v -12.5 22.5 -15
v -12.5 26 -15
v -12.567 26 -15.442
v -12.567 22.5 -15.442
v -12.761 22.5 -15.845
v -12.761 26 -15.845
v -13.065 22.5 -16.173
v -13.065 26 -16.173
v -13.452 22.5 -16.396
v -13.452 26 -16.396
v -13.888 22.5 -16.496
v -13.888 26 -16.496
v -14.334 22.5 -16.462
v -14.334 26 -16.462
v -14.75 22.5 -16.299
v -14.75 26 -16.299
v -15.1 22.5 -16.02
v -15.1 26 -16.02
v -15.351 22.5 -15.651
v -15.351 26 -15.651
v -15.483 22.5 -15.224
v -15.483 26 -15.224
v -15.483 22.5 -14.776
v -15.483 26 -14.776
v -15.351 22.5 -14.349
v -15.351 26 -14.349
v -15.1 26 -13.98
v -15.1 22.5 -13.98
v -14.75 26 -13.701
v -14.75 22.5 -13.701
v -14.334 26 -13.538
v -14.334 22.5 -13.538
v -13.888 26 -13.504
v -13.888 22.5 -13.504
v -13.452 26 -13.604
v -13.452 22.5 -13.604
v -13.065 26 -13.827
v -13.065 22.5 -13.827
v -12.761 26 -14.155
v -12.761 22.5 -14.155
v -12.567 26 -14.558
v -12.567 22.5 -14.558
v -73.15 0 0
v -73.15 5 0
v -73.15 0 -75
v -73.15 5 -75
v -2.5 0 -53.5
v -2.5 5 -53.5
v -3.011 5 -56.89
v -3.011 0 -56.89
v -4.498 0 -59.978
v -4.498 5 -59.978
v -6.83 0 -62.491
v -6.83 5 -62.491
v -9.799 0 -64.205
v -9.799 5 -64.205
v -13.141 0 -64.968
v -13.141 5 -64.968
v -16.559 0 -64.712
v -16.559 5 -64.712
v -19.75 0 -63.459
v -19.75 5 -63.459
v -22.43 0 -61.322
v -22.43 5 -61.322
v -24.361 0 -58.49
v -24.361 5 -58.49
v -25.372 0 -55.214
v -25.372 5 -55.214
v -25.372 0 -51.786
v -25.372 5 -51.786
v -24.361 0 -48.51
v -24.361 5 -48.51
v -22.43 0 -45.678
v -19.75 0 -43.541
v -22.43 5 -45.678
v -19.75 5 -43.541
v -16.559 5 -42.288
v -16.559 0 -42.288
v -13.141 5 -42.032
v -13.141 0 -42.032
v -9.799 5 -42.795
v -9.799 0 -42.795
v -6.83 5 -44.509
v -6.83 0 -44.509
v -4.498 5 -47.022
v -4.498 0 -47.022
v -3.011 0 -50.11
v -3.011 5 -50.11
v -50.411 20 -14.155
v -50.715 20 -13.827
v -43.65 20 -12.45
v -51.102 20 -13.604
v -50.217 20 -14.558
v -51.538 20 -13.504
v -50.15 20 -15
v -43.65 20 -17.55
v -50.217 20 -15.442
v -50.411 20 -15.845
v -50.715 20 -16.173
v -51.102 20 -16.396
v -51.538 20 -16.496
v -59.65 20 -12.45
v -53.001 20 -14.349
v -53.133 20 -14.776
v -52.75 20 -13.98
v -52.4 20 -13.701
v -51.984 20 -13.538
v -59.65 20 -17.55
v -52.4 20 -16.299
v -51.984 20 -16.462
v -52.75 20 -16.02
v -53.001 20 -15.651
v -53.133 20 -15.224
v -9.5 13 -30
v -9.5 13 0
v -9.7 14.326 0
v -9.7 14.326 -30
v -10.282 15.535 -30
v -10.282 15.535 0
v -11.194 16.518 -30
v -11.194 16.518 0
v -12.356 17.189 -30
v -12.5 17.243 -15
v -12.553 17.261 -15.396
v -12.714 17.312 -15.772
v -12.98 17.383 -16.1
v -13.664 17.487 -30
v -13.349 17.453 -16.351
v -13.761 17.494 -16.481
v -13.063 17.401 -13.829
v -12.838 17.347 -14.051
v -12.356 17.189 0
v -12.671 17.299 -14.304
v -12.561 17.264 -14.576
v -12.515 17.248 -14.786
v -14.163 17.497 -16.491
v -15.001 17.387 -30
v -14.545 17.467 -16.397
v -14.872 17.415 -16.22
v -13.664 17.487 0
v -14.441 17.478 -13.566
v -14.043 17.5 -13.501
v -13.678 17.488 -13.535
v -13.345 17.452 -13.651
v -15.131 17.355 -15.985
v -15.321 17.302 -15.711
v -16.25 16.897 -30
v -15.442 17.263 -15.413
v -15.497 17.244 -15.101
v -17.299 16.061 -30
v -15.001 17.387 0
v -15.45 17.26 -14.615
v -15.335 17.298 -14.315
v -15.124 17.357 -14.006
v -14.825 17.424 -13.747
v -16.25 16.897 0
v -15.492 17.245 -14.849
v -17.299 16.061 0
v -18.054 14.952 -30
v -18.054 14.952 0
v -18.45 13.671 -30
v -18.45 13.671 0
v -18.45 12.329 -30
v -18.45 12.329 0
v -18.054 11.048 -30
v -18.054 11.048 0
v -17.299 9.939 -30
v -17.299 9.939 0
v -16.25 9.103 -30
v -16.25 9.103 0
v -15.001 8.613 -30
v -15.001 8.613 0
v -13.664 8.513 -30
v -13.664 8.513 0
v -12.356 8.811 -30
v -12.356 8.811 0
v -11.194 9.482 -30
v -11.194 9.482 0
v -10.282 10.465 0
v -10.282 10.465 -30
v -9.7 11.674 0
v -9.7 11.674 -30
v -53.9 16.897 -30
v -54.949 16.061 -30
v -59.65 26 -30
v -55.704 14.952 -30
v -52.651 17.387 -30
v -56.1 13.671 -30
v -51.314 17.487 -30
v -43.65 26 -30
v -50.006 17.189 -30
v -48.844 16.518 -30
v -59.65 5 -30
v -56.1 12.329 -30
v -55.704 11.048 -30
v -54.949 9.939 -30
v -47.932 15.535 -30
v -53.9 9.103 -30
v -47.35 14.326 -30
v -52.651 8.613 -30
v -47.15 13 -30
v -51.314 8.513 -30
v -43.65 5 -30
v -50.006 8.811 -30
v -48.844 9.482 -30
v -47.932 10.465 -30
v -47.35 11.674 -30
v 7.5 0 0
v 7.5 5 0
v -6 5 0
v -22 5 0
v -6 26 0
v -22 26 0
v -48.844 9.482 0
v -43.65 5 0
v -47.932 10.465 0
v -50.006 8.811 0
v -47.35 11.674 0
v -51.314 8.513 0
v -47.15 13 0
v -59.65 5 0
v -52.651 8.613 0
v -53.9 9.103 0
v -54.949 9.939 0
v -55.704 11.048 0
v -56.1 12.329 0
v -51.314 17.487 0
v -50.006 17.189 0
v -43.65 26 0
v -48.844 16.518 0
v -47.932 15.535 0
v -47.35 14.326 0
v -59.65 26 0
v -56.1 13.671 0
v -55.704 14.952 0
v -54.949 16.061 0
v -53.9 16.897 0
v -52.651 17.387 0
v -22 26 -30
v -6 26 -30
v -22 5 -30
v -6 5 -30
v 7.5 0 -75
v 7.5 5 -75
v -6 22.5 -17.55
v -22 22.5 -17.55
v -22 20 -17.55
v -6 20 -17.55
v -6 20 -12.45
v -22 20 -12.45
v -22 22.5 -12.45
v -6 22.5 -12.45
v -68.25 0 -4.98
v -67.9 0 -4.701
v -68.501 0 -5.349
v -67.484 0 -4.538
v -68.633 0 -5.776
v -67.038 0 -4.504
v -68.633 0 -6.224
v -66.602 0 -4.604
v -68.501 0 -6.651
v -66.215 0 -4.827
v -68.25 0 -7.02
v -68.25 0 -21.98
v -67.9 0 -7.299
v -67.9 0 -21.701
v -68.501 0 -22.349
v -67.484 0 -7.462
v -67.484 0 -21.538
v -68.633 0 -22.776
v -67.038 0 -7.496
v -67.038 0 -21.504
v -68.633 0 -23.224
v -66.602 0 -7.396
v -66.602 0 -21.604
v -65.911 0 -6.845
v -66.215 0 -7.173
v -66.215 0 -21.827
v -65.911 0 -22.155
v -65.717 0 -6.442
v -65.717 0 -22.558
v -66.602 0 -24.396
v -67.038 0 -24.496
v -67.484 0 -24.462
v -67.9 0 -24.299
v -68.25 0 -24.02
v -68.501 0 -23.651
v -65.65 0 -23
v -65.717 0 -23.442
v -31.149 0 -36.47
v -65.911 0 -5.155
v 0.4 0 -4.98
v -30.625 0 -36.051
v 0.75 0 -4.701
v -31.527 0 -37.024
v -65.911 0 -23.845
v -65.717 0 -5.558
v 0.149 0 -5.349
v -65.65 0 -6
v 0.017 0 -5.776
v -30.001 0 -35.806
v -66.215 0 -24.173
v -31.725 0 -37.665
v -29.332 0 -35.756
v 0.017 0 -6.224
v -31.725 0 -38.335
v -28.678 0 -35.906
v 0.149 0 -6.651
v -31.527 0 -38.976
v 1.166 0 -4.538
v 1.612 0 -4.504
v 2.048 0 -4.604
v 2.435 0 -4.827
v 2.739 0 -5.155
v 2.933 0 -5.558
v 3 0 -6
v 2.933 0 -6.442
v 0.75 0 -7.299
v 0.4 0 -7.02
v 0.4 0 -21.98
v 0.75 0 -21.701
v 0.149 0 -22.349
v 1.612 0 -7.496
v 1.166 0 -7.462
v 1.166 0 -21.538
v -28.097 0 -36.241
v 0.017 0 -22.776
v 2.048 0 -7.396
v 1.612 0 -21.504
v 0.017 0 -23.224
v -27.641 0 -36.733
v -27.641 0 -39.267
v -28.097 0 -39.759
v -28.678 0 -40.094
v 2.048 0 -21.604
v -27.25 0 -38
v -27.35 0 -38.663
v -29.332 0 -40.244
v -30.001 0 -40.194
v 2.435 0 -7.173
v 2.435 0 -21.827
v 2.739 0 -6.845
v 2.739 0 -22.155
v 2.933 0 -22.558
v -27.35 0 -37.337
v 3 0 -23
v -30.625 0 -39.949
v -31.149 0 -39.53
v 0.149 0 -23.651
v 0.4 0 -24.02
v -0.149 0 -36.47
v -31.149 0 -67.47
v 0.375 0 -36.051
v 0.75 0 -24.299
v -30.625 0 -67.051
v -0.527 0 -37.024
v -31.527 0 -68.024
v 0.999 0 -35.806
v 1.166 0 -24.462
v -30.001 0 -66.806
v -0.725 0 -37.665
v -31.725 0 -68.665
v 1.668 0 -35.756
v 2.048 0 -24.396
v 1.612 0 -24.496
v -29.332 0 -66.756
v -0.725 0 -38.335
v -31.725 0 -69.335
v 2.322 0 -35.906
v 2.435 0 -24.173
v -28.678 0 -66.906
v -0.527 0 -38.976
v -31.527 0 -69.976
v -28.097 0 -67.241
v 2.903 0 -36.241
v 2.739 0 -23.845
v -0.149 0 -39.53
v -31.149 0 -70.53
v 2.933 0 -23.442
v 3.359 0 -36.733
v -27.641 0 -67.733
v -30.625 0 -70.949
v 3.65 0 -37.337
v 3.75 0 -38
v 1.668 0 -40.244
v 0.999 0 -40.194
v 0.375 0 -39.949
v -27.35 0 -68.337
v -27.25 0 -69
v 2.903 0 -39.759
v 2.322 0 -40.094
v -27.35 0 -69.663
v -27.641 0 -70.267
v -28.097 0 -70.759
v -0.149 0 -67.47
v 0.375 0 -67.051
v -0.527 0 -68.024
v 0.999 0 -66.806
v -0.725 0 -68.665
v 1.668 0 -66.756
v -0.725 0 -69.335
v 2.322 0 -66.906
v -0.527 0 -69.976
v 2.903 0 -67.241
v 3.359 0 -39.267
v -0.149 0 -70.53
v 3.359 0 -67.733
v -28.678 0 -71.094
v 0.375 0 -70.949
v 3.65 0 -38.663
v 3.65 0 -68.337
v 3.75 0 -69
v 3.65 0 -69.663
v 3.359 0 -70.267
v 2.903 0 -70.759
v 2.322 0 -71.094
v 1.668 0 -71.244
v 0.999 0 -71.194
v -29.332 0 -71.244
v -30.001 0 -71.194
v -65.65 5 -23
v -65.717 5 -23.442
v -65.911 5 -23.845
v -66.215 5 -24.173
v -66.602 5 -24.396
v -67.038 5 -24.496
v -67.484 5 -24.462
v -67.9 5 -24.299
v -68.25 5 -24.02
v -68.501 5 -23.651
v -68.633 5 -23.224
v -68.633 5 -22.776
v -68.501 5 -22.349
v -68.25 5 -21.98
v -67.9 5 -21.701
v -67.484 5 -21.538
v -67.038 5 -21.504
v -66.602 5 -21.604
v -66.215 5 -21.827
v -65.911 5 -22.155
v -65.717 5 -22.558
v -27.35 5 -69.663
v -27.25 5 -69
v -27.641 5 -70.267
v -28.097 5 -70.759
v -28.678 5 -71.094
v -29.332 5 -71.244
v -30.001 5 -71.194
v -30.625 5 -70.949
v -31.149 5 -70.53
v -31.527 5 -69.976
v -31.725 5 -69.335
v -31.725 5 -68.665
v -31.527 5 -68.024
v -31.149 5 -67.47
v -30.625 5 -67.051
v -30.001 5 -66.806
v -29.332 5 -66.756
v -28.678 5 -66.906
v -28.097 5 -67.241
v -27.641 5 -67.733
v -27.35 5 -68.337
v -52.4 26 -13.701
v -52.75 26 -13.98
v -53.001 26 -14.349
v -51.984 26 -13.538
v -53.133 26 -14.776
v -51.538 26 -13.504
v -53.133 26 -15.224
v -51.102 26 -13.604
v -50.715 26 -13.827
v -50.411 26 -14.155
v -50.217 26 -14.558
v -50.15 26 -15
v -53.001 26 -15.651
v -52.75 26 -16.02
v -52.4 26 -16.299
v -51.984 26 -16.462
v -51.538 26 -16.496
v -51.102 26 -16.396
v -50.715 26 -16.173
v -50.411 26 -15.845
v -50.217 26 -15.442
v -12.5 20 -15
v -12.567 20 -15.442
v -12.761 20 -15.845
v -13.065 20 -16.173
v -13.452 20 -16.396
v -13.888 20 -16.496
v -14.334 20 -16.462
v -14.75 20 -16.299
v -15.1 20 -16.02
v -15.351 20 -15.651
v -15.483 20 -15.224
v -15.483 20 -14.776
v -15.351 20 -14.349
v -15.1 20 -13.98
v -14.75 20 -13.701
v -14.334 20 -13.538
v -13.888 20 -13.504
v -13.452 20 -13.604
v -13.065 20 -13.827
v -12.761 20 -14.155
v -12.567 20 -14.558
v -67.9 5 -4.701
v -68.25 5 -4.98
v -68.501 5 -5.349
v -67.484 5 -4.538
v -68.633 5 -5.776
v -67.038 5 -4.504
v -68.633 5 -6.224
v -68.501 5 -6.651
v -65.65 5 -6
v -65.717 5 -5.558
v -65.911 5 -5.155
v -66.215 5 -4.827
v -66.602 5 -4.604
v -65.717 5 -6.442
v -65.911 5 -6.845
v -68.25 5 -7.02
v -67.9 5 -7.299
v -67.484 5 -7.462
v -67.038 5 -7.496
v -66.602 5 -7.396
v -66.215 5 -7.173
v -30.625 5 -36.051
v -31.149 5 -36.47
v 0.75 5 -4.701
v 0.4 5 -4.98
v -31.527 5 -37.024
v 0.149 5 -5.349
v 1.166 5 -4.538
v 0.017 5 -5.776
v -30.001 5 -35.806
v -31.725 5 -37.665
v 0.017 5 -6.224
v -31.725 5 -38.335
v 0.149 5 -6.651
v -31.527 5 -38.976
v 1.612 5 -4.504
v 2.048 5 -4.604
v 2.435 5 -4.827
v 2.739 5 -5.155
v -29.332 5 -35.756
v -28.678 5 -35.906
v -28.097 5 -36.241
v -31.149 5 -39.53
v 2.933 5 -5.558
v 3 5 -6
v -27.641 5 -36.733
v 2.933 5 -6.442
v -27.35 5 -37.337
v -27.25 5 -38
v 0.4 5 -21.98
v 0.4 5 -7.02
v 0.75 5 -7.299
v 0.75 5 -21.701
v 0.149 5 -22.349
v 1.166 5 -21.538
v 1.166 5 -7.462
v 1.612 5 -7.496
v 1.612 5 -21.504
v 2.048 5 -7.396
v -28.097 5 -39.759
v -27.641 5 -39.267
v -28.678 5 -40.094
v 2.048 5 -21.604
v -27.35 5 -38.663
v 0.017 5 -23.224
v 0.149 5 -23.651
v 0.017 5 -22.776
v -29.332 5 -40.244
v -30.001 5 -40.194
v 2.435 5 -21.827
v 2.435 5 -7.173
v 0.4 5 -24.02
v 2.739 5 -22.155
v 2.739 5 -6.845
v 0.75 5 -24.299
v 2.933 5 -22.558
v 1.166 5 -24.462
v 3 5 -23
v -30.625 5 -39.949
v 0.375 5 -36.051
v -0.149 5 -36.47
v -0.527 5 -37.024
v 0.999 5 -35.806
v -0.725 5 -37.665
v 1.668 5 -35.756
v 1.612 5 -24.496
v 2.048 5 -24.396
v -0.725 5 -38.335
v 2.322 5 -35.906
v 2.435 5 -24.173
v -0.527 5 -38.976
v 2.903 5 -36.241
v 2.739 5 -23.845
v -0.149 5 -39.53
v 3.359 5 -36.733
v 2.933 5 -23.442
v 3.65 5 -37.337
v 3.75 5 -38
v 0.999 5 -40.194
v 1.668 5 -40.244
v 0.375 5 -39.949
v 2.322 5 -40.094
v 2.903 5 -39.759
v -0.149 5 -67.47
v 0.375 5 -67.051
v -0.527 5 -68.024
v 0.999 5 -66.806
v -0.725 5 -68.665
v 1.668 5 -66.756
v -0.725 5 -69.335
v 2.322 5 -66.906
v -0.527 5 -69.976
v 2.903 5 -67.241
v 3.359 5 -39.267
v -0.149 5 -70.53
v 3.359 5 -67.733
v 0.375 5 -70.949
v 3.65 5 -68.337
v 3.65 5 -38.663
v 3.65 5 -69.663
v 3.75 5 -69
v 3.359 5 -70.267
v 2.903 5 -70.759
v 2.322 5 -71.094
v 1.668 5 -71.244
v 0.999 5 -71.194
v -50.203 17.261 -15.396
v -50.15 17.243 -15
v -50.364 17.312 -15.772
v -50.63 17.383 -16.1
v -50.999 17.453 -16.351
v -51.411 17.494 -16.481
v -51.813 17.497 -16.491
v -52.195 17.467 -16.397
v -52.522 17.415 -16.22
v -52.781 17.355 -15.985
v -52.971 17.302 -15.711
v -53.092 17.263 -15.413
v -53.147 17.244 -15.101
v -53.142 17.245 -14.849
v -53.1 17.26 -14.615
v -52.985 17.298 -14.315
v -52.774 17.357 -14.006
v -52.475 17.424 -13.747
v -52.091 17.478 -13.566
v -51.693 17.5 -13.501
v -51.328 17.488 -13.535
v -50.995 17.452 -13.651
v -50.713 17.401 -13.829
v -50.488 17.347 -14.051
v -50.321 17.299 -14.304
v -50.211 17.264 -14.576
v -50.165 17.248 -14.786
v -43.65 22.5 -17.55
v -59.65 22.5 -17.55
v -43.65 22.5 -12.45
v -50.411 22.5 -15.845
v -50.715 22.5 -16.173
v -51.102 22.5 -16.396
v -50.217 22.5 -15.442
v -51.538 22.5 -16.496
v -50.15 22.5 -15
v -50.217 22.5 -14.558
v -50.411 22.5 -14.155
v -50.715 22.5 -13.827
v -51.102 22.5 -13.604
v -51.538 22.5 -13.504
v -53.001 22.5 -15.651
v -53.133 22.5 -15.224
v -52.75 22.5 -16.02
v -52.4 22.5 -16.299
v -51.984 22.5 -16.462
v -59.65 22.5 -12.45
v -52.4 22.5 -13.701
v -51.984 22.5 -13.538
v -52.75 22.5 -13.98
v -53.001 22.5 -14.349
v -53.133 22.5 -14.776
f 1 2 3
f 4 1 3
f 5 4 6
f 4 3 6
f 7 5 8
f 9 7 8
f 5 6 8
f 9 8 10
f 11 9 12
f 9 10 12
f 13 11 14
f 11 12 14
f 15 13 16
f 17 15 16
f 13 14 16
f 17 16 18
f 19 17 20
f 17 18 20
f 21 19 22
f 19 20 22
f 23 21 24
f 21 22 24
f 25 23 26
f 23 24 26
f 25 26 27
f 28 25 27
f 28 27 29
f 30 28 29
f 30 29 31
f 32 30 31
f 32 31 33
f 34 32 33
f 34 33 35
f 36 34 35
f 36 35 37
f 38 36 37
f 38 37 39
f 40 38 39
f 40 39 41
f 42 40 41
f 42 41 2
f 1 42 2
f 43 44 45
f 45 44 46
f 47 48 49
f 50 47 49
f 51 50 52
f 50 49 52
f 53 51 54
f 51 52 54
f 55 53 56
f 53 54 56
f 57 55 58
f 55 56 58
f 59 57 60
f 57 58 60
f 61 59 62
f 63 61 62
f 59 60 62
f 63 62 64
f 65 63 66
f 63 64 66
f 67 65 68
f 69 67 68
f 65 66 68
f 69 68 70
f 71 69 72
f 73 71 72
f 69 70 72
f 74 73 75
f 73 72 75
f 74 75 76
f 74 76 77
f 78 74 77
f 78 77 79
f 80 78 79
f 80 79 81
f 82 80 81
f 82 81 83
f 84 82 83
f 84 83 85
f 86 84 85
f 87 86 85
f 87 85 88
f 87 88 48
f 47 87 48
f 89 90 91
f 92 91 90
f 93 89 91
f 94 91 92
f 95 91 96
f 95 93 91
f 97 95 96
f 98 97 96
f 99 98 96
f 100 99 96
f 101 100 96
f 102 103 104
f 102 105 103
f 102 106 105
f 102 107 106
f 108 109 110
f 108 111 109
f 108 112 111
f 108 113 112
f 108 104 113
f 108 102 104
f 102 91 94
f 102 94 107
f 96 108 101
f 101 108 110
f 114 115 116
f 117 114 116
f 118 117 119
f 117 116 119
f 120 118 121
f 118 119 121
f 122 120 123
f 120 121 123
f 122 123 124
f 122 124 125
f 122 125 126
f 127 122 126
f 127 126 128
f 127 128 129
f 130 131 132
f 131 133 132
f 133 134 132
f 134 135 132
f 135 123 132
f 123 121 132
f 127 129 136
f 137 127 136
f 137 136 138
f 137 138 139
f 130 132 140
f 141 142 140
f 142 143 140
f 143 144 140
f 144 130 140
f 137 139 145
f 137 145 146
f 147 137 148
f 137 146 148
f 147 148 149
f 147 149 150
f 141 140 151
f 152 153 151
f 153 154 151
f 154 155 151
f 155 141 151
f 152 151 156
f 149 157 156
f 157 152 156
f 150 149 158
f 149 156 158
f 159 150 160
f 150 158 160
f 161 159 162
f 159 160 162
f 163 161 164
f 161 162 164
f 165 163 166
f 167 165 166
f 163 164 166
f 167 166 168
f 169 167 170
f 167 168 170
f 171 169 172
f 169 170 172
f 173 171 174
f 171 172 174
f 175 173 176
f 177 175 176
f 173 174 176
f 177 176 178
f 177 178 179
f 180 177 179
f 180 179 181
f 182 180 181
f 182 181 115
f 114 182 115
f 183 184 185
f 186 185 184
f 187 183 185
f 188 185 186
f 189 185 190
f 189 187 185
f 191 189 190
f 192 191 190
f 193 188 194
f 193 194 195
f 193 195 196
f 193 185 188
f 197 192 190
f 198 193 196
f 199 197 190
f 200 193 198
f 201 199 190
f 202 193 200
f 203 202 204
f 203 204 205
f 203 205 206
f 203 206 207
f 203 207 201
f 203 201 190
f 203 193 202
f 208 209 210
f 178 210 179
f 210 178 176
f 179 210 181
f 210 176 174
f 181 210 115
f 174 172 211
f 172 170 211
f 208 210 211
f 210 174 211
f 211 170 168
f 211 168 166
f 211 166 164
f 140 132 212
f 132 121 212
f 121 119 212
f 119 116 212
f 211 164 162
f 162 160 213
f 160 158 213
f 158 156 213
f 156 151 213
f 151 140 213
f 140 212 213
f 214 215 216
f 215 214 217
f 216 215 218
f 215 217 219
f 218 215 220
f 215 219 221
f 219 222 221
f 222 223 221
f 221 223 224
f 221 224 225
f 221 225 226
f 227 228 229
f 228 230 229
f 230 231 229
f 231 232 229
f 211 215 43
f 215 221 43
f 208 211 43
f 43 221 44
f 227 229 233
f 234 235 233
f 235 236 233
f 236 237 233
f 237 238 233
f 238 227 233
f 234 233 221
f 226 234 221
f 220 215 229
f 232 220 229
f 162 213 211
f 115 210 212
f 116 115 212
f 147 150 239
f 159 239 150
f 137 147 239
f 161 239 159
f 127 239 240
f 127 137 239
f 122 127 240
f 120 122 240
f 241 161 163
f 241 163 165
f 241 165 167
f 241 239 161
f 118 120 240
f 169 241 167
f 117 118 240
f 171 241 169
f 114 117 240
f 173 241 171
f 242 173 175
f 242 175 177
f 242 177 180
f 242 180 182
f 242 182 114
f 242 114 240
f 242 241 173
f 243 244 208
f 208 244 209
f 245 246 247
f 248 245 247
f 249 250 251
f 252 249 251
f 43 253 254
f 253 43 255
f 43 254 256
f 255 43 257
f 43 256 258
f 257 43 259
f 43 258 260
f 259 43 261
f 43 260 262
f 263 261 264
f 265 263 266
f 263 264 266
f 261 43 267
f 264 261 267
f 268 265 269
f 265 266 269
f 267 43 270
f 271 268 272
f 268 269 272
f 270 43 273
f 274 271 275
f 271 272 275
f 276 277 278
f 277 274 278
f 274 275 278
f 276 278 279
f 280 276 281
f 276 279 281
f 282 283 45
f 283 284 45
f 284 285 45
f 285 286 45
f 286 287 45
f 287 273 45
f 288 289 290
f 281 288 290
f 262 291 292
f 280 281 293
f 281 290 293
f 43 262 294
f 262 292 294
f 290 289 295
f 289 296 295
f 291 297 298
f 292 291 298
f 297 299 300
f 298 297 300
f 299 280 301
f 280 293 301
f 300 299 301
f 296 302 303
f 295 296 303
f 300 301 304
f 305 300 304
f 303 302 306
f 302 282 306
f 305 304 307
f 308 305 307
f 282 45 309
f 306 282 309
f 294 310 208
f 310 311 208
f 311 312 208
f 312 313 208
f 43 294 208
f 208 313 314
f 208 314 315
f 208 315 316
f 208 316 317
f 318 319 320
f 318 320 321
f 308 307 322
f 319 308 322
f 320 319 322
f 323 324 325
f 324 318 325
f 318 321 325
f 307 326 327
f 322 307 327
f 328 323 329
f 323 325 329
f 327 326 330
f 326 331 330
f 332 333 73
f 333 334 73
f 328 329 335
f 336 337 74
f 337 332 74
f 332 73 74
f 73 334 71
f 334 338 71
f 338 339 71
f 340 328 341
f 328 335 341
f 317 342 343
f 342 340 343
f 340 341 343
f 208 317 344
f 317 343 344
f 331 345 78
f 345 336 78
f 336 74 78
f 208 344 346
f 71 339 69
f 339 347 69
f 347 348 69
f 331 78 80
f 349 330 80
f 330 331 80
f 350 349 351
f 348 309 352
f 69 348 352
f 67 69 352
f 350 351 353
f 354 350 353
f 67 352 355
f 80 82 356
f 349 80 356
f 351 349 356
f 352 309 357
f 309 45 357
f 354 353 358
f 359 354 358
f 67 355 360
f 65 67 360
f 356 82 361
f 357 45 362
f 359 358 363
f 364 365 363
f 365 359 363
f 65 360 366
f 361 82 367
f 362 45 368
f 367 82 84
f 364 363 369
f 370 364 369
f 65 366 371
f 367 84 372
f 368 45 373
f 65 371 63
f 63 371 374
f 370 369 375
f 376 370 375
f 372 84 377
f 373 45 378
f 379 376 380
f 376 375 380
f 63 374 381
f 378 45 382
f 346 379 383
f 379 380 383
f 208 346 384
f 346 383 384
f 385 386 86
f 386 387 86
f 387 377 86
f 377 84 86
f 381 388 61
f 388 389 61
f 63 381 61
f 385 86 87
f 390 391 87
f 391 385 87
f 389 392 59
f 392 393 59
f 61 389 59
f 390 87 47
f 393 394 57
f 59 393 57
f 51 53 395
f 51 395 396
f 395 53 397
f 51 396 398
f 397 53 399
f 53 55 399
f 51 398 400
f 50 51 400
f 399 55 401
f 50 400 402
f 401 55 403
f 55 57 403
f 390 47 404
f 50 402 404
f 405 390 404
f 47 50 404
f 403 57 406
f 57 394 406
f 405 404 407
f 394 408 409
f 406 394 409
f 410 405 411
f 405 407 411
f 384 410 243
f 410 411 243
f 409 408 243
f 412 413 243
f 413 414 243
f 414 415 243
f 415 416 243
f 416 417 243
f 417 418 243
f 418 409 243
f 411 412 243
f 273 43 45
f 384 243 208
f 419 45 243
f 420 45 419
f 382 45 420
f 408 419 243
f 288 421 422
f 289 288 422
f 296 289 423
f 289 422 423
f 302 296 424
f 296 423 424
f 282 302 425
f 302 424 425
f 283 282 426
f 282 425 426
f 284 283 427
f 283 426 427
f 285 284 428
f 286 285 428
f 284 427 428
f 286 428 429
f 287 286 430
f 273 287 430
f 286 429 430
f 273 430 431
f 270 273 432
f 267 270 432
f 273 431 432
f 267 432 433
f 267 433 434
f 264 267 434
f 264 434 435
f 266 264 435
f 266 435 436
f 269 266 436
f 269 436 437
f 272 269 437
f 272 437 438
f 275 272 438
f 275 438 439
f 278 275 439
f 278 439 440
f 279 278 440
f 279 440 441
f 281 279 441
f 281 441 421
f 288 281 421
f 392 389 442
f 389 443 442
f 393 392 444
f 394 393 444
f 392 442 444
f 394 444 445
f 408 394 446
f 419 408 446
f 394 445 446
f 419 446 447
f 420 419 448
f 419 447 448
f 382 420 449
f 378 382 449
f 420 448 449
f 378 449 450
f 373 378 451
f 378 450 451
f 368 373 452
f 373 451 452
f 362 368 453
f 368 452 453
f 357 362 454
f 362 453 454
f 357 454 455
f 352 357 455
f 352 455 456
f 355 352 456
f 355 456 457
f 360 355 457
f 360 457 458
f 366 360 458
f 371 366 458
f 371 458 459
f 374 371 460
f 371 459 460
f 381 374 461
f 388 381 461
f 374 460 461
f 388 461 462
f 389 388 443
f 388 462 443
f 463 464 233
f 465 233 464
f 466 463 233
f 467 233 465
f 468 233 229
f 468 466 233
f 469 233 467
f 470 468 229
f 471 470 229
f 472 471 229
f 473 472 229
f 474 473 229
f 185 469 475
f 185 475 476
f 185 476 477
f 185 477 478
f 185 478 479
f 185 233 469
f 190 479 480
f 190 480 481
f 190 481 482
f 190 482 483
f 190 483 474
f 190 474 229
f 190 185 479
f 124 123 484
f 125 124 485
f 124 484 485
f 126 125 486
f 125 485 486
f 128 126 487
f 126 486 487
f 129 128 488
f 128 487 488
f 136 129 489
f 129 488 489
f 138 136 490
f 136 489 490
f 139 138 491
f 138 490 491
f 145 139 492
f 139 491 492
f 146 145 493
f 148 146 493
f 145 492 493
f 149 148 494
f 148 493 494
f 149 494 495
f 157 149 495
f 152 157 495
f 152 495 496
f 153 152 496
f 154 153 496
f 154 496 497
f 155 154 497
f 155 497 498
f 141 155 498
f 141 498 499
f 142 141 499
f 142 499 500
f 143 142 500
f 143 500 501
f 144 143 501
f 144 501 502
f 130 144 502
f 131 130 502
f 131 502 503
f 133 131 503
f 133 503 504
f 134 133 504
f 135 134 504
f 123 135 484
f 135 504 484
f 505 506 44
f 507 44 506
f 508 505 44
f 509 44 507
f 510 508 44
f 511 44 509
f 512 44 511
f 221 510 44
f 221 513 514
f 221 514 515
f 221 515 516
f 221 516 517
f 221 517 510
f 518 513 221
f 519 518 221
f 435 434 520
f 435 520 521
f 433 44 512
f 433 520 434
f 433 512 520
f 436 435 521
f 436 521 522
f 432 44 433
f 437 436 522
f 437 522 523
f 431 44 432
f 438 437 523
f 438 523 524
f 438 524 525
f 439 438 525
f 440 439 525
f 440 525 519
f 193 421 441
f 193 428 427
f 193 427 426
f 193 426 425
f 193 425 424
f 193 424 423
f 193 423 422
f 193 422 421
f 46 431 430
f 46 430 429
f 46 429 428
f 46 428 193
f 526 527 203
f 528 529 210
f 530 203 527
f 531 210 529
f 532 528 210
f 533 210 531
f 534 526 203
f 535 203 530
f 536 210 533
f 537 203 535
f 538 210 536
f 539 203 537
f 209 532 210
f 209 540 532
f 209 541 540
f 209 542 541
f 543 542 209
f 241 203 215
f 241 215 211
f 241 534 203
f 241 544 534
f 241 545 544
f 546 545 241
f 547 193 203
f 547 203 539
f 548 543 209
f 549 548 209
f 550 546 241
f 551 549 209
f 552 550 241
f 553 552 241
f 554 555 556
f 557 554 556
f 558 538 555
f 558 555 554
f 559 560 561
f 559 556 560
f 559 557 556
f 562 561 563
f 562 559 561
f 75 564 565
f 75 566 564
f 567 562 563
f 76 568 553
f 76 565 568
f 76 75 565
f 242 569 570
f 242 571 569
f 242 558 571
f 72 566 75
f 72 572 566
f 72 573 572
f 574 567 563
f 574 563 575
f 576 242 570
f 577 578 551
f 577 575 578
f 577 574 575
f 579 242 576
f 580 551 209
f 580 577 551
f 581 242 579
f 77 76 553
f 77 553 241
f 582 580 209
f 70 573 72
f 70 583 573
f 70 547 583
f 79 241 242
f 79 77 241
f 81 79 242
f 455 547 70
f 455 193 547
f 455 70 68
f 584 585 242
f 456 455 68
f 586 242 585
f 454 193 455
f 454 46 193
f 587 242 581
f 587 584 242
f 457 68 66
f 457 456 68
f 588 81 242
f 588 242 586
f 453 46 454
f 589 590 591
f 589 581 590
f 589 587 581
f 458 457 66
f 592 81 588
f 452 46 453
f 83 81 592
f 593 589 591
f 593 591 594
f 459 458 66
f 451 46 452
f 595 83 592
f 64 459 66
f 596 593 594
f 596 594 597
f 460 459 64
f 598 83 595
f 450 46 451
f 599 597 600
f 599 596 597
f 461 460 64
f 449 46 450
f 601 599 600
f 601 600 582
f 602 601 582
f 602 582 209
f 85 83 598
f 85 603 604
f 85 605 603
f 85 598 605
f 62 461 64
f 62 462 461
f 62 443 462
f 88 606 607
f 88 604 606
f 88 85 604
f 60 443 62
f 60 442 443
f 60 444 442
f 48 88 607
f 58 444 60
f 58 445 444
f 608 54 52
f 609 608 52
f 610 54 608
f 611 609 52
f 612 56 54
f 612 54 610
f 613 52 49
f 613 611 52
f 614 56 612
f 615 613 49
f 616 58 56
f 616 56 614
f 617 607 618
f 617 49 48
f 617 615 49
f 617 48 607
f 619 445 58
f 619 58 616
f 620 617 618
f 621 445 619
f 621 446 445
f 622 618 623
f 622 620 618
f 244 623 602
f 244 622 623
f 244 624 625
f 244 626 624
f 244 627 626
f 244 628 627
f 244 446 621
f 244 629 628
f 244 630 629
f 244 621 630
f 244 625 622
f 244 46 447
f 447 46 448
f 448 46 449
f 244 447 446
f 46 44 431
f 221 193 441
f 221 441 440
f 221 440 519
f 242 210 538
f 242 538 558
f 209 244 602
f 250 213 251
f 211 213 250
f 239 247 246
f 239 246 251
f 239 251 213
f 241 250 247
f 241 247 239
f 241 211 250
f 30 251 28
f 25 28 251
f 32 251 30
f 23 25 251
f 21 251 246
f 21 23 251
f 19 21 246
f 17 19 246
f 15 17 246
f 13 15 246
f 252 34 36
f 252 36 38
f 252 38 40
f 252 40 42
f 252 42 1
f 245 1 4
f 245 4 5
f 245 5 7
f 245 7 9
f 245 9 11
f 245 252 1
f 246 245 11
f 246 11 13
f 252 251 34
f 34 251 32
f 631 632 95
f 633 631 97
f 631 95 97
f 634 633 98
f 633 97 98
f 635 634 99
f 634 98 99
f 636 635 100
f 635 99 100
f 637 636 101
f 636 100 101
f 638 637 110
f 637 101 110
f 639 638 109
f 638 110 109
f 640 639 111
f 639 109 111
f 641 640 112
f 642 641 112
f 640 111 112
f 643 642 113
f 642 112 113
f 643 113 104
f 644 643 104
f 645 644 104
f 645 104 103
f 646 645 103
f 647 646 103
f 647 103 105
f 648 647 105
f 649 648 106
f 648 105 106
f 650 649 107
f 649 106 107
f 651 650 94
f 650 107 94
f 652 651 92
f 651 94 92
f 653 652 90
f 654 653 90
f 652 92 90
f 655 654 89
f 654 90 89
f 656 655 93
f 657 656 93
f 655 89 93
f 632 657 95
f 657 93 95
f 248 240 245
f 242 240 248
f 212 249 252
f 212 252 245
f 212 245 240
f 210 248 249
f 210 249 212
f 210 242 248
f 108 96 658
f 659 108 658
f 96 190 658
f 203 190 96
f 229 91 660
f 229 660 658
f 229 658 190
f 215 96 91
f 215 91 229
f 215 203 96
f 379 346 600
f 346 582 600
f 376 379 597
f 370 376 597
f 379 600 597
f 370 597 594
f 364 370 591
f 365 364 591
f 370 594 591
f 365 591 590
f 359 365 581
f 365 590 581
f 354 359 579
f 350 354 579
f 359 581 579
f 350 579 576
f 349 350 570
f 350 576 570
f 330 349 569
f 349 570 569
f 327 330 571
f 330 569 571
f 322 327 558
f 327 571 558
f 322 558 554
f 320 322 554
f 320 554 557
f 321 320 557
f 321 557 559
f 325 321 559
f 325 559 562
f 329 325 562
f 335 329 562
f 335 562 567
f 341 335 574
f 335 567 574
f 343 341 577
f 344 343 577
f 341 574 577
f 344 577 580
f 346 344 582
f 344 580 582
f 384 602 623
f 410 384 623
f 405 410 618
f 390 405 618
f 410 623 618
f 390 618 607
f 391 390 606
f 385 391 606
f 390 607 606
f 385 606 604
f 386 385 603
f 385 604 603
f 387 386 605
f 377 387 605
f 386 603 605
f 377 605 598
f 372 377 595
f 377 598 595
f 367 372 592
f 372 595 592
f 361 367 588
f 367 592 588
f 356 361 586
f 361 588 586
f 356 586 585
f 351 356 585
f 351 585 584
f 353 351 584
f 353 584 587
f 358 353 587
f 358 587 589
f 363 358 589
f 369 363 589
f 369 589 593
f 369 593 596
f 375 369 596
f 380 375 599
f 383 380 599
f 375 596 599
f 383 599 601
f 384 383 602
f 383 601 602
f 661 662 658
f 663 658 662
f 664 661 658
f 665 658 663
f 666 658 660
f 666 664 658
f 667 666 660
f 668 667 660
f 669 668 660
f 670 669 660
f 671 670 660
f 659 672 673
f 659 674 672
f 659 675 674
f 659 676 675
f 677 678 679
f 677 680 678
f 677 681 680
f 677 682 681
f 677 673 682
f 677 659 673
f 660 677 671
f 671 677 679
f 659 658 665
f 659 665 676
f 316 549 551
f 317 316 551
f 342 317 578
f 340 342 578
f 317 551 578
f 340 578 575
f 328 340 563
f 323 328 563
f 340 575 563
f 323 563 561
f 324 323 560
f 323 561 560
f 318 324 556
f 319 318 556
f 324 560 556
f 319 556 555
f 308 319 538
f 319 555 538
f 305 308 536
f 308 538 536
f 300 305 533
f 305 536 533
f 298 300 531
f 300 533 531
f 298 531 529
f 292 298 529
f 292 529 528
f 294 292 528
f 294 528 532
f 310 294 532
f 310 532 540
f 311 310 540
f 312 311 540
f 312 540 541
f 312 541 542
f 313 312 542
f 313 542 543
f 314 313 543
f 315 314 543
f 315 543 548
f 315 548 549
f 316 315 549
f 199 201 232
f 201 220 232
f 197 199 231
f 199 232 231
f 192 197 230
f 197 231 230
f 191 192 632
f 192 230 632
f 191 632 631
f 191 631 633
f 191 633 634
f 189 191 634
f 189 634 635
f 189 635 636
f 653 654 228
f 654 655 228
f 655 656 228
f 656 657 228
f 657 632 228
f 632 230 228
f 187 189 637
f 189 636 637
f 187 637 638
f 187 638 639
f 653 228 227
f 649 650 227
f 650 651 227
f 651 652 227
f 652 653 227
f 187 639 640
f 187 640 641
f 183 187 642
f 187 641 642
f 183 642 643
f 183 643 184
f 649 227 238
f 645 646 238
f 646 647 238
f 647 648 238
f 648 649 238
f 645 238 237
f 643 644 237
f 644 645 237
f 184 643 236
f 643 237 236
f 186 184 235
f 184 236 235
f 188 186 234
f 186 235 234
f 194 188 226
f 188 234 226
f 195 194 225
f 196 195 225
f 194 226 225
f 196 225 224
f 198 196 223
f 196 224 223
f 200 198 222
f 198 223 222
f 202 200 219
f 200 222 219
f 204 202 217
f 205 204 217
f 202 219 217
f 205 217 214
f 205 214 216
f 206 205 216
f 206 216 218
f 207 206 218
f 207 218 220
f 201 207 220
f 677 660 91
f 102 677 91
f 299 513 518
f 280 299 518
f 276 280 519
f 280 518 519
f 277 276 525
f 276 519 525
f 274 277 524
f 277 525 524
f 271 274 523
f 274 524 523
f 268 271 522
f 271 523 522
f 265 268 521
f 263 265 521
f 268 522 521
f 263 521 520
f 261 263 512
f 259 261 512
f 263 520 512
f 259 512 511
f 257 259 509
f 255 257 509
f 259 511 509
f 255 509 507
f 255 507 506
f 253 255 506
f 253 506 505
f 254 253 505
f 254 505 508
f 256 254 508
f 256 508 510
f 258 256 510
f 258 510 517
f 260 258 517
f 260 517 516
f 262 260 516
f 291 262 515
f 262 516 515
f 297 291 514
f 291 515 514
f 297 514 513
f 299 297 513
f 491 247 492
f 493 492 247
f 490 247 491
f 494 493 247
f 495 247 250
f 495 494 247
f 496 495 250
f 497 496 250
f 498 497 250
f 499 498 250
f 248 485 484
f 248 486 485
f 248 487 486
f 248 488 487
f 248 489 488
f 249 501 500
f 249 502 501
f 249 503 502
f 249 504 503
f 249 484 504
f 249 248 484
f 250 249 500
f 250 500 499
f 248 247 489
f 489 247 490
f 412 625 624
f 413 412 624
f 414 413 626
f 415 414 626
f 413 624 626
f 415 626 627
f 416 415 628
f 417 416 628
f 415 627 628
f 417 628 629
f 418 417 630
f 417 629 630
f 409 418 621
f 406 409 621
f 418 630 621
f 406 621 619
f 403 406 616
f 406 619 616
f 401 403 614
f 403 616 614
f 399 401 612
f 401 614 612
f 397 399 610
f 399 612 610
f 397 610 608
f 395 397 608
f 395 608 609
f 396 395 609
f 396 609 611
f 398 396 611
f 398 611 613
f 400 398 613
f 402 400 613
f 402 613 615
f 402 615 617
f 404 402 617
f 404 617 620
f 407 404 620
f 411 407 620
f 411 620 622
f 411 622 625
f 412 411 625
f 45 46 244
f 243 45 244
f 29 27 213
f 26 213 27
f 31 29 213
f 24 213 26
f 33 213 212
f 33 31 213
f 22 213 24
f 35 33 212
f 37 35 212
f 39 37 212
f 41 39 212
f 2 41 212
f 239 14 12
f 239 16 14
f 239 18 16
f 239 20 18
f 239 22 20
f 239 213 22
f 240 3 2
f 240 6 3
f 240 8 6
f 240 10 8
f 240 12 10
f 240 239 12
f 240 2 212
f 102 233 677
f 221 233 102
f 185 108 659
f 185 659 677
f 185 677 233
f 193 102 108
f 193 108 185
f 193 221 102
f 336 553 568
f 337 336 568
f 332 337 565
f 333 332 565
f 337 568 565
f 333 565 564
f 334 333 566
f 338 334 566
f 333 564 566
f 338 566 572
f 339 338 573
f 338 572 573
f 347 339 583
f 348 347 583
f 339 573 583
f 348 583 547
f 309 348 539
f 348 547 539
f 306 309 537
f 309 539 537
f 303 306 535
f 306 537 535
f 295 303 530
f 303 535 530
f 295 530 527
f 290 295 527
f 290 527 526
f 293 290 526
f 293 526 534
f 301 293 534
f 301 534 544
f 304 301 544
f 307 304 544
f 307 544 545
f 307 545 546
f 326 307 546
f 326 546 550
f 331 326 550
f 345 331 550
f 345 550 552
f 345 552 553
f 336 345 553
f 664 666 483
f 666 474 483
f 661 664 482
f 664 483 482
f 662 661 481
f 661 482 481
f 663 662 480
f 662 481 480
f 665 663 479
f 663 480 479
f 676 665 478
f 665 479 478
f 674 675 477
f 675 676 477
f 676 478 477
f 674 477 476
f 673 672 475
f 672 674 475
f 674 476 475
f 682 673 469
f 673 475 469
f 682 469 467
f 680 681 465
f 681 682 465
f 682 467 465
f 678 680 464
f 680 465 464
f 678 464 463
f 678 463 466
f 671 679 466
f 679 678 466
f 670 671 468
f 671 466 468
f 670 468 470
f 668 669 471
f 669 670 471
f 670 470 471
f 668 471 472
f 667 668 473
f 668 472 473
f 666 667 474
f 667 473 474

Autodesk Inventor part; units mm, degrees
ref_plane "YZ Plane" through (0, 0, 0) normal (1, 0, 0) x (0, 1, 0)
ref_plane "XZ Plane" through (0, 0, 0) normal (0, 1, 0) x (-1, 0, 0)
ref_plane "XY Plane" through (0, 0, 0) normal (0, 0, 1) x (1, 0, 0)
sketch "Skizze1" plane through (0, 0, 0) normal (0, 1, 0) x (-1, 0, 0)
  line L0 (0, 0) -> (65.65, 0)
  line L1 (65.65, 0) -> (65.65, -80)
  line L2 (65.65, -80) -> (0, -80)
  line L3 (0, -80) -> (0, 0)
  dimension "d0" = 65.65
  dimension "d1" = 80
extrude "Extrusion1" add sketch "Skizze1" along normal blind 5
sketch "Skizze2" plane through (0, 5, 0) normal (0, 1, 0) x (1, 0, 0)
  line L0 (-65.65, 80) -> (-65.65, 0) projected
  line L1 (-65.65, 0) -> (0, 0) projected
  line L2 (-65.65, 0) -> (-59.65, 0) construction
  line L3 (-59.65, 0) -> (-59.65, 30)
  line L4 (-59.65, 30) -> (-43.65, 30)
  line L5 (-43.65, 30) -> (-43.65, 0)
  line L6 (-43.65, 0) -> (-59.65, 0)
  line L7 (-22, 0) -> (-22, 30)
  line L8 (-22, 30) -> (-6, 30)
  line L9 (-6, 30) -> (-6, 0)
  line L10 (-6, 0) -> (-22, 0)
  dimension "d4" = 6
  dimension "d6" = 30
  dimension "d7" = 16
  dimension "d8" = 90
  dimension "d9" = 16
  dimension "d10" = 21.65
  dimension "d11" = 30
  dimension "d12" = 16
  dimension "d13" = 90
  dimension "d14" = 30
  dimension "d15" = 90
extrude "Extrusion2" add sketch "Skizze2" along normal blind 21 contours L3 L4 L5 L1
sketch "Skizze3" plane through (0, 5, 0) normal (0, 1, 0) x (1, 0, 0)
  line L0 (-43.65, 0) -> (0, 0) projected
  line L1 (-43.65, 0) -> (-22, 0)
  line L2 (-22, 0) -> (-22, 30)
  line L3 (-22, 30) -> (-6, 30)
  line L4 (-6, 30) -> (-6, 0)
  line L5 (-6, 0) -> (-22, 0)
  dimension "d18" = 21.65
  dimension "d19" = 30
  dimension "d21" = 16
  dimension "d22" = 16
extrude "Extrusion3" add sketch "Skizze3" along normal blind 21
sketch "Skizze4" plane through (0, 5, 0) normal (0, 1, 0) x (1, 0, 0)
  line L0 (-65.65, 0) -> (0, 0) projected
  line L1 (-5.9719, 0) -> (14.5281, 0)
  line L2 (14.5281, 0) -> (14.5281, 80)
  line L3 (0, 0) -> (0, 80) projected
  line L4 (14.5281, 80) -> (0, 80)
  line L5 (0, 80) -> (0, 0)
  dimension "d25" = 20.5
  dimension "d26" = 80
  dimension "d27" = 90
extrude "Extrusion4" add sketch "Skizze4" against normal blind 5
sketch "Skizze5" plane through (0, 5, 0) normal (0, 1, 0) x (1, 0, 0)
  line L0 (-22, 30) -> (-6, 30) projected
  line L1 (-22, 30) -> (-14, 30)
  line L2 (-14, 30) -> (-14, 38)
  line L3 (-14, 38) -> (-29.5, 38)
  circle A0 centre (-29.5, 38) radius 1
  point P0 (0, 0)
  dimension "d30" = 8
  dimension "d31" = 8
  dimension "d32" = 15.5
  dimension "d33" = 2
extrude "Extrusion5" cut sketch "Skizze5" against normal blind 5
sketch "Skizze6" plane through (0, 5, 0) normal (0, 1, 0) x (1, 0, 0)
  circle A0 centre (-29.5, 38) radius 1 projected
  line L0 (-29.5, 38) -> (1.5, 38)
  line L1 (-29.5, 38) -> (1.5, 38) construction
  circle A1 centre (1.5, 38) radius 1
  point P0 (0, 0)
  dimension "d36" = 31
  dimension "d37" = 0
  dimension "d38" = 2
extrude "Extrusion6" cut sketch "Skizze6" against normal blind 5 contours A1
sketch "Skizze7" plane through (0, 5, 0) normal (0, 1, 0) x (1, 0, 0)
  circle A0 centre (1.5, 38) radius 1 projected
  line L0 (1.5, 38) -> (1.5, 69)
  circle A1 centre (1.5, 69) radius 1
  point P0 (0, 0)
  dimension "d41" = 31
  dimension "d42" = 2
extrude "Extrusion7" cut sketch "Skizze7" against normal blind 5 contours A1
sketch "Skizze8" plane through (0, 5, 0) normal (0, 1, 0) x (1, 0, 0)
  circle A0 centre (-29.5, 38) radius 1 projected
  line L0 (-29.5, 38) -> (-29.5, 69)
  circle A1 centre (-29.5, 69) radius 1
  point P0 (0, 0)
  dimension "d45" = 31
  dimension "d46" = 2
extrude "Extrusion8" cut sketch "Skizze8" against normal blind 5 contours A1
sketch "Skizze9" plane through (0, 5, 0) normal (0, 1, 0) x (1, 0, 0)
  circle A0 centre (1.5, 38) radius 1 projected
  line L0 (1.5, 38) -> (7.5, 38)
  line L1 (14.5281, 80) -> (-65.65, 80) projected
  line L2 (-65.65, 0) -> (14.5281, 0) projected
  line L3 (14.5281, 0) -> (14.5281, 80) projected
  line L4 (7.5, 38) -> (14.5281, 38)
  line L5 (14.5281, 38) -> (14.5281, 80)
  line L6 (14.5281, 80) -> (7.5, 80)
  line L7 (7.5, 80) -> (7.5, 38)
  point P0 (0, 0)
  dimension "d49" = 6
extrude "Extrusion9" cut sketch "Skizze9" against normal blind 5 contours L7 L1 L3 L4
sketch "Skizze10" plane through (0, 5, 0) normal (0, 1, 0) x (1, 0, 0)
  line L0 (7.5, 38) -> (7.5, 80) projected
  line L1 (14.5281, 0) -> (14.5281, 38) projected
  line L2 (7.5, 38) -> (14.5281, 38)
  line L3 (14.5281, 38) -> (14.5281, 0)
  line L4 (14.5281, 0) -> (7.5, 0)
  line L5 (7.5, 0) -> (7.5, 38)
  point P0 (0, 0)
extrude "Extrusion10" cut sketch "Skizze10" against normal blind 5
sketch "Skizze11" plane through (0, 5, 0) normal (0, 1, 0) x (1, 0, 0)
  circle A0 centre (1.5, 69) radius 1 projected
  line L0 (1.5, 69) -> (1.5, 75)
  line L1 (1.5, 75) -> (7.5, 75)
  line L2 (7.5, 0) -> (7.5, 80) projected
  line L3 (7.5, 80) -> (1.5, 80)
  line L4 (7.5, 80) -> (-65.65, 80) projected
  line L5 (1.5, 75) -> (1.5, 80)
  point P0 (0, 0)
  dimension "d54" = 6
extrude "Extrusion11" cut sketch "Skizze11" against normal blind 5 contours L5 L3 L2 L1
sketch "Skizze12" plane through (0, 5, 0) normal (0, 1, 0) x (1, 0, 0)
  line L0 (1.5, 80) -> (-65.65, 80) projected
  line L1 (1.5, 75) -> (-65.65, 75)
  line L2 (-65.65, 75) -> (-65.65, 80)
  line L3 (-65.65, 80) -> (1.5, 80)
  line L4 (1.5, 80) -> (1.5, 75)
  point P0 (0, 0)
extrude "Extrusion12" cut sketch "Skizze12" against normal blind 5
sketch "Skizze13" plane through (0, 5, 0) normal (0, 1, 0) x (1, 0, 0)
  circle A0 centre (1.5, 38) radius 1 projected
  line L0 (1.5, 38) -> (1.5, 23)
  circle A1 centre (1.5, 23) radius 1
  point P0 (0, 0)
  dimension "d59" = 15
  dimension "d60" = 2
extrude "Extrusion13" cut sketch "Skizze13" against normal blind 5 contours A1
sketch "Skizze14" plane through (0, 5, 0) normal (0, 1, 0) x (1, 0, 0)
  circle A0 centre (1.5, 23) radius 1 projected
  line L0 (-65.65, 0) -> (7.5, 0) projected
  line L1 (-6, 30) -> (-6, 0) projected
  line L2 (1.5, 0) -> (-6, 0)
  line L3 (1.5, 0) -> (1.5, 6)
  circle A1 centre (1.5, 6) radius 1
  point P0 (0, 0)
  dimension "d63" = 6
  dimension "d64" = 2
extrude "Extrusion14" cut sketch "Skizze14" against normal blind 5 contours A1
sketch "Skizze15" plane through (0, 5, 0) normal (0, 1, 0) x (1, 0, 0)
  line L0 (-65.65, 0) -> (7.5, 0) projected
  line L1 (-65.65, 0) -> (-62.65, 0)
  line L2 (-62.65, 0) -> (-62.65, 6)
  circle A0 centre (-62.65, 6) radius 1
  point P0 (0, 0)
  dimension "d67" = 3
  dimension "d68" = 6
  dimension "d69" = 2
extrude "Extrusion15" cut sketch "Skizze15" against normal blind 5
sketch "Skizze16" plane through (0, 5, 0) normal (0, 1, 0) x (1, 0, 0)
  circle A0 centre (-62.65, 6) radius 1 projected
  line L0 (-62.65, 6) -> (-62.65, 23)
  circle A1 centre (-62.65, 23) radius 1
  point P0 (0, 0)
  dimension "d72" = 17
  dimension "d73" = 2
extrude "Extrusion16" cut sketch "Skizze16" against normal blind 5 contours A1
sketch "Skizze17" plane through (-65.65, 0, 0) normal (0, 0, 1) x (1, 0, 0)
  line L0 (6, 26) -> (22, 26) projected
  line L1 (6, 26) -> (14, 26)
  line L2 (14, 26) -> (14, 13)
  circle A0 centre (14, 13) radius 4.5
  point P0 (65.65, 0)
  dimension "d76" = 8
  dimension "d77" = 13
  dimension "d78" = 9
extrude "Extrusion17" cut sketch "Skizze17" against normal blind 30
sketch "Skizze18" plane through (-65.65, 0, 0) normal (0, 0, 1) x (1, 0, 0)
  line L0 (43.65, 5) -> (43.65, 26) projected
  line L1 (43.65, 26) -> (51.65, 26)
  line L2 (51.65, 26) -> (51.65, 13)
  circle A0 centre (51.65, 13) radius 4.5
  point P0 (65.65, 0)
  dimension "d81" = 8
  dimension "d82" = 13
  dimension "d83" = 9
extrude "Extrusion18" cut sketch "Skizze18" against normal blind 30
sketch "Skizze19" plane through (-59.65, 5, -30) normal (-1, 0, 0) x (0, 0, 1)
  line L0 (0, 0) -> (0, 21) projected
  line L1 (0, 21) -> (15, 21)
  line L2 (0, 21) -> (30, 21) projected
  line L3 (15, 21) -> (15, 17)
  line L4 (15, 17) -> (17.75, 17)
  line L5 (17.75, 17) -> (12.25, 17)
  line L6 (12.25, 17) -> (12.25, 15.75)
  line L7 (12.25, 15.75) -> (17.75, 15.75)
  line L8 (17.75, 15.75) -> (17.75, 17)
  point P0 (30, -5)
  dimension "d86" = 15
  dimension "d87" = 4
  dimension "d88" = 2.75
  dimension "d89" = 5.5
  dimension "d90" = 1.25
extrude "Extrusion19" cut sketch "Skizze19" against normal blind 16
sketch "Skizze20" plane through (0, 5, 0) normal (0, 1, 0) x (1, 0, 0)
  circle A0 centre (1.5, 23) radius 1 projected
  circle A1 centre (1.5, 23) radius 1.5
  point P0 (0, 0)
  dimension "d93" = 3
extrude "Extrusion20" cut sketch "Skizze20" against normal blind 5 contours A0 | A1
sketch "Skizze21" plane through (0, 5, 0) normal (0, 1, 0) x (1, 0, 0)
  circle A0 centre (1.5, 6) radius 1 projected
  circle A1 centre (1.5, 6) radius 1.5
  point P0 (0, 0)
  dimension "d96" = 3
extrude "Extrusion21" cut sketch "Skizze21" against normal blind 5 contours A0 | A1
sketch "Skizze22" plane through (0, 5, 0) normal (0, 1, 0) x (1, 0, 0)
  circle A0 centre (-62.65, 23) radius 1 projected
  circle A1 centre (-62.65, 23) radius 1.5
  point P0 (0, 0)
  dimension "d99" = 3
extrude "Extrusion22" cut sketch "Skizze22" against normal blind 5 contours A0 | A1
sketch "Skizze23" plane through (0, 5, 0) normal (0, 1, 0) x (1, 0, 0)
  circle A0 centre (-62.65, 6) radius 1 projected
  circle A1 centre (-62.65, 6) radius 1.5
  point P0 (0, 0)
  dimension "d102" = 3
extrude "Extrusion23" cut sketch "Skizze23" against normal blind 5 contours A0 | A1
sketch "Skizze24" plane through (0, 5, 0) normal (0, 1, 0) x (1, 0, 0)
  circle A0 centre (1.5, 69) radius 1 projected
  circle A1 centre (1.5, 69) radius 2.25
  point P0 (0, 0)
  dimension "d105" = 4.5
extrude "Extrusion24" cut sketch "Skizze24" against normal blind 5 contours A0 | A1
sketch "Skizze25" plane through (0, 5, 0) normal (0, 1, 0) x (1, 0, 0)
  circle A0 centre (-29.5, 69) radius 1 projected
  circle A1 centre (-29.5, 69) radius 2.25
  point P0 (0, 0)
  dimension "d108" = 4.5
extrude "Extrusion25" cut sketch "Skizze25" against normal blind 5 contours A0 | A1
sketch "Skizze26" plane through (0, 5, 0) normal (0, 1, 0) x (1, 0, 0)
  circle A0 centre (1.5, 38) radius 1 projected
  circle A1 centre (1.5, 38) radius 2.25
  point P0 (0, 0)
  dimension "d112" = 4.5
extrude "Extrusion26" cut sketch "Skizze26" against normal blind 5 contours A0 | A1
sketch "Skizze27" plane through (0, 5, 0) normal (0, 1, 0) x (1, 0, 0)
  circle A0 centre (-29.5, 38) radius 1 projected
  circle A1 centre (-29.5, 38) radius 2.25
  point P0 (0, 0)
  dimension "d115" = 4.5
extrude "Extrusion27" cut sketch "Skizze27" against normal blind 5 contours A0 | A1
sketch "Skizze28" plane through (0, 26, 0) normal (0, 1, 0) x (1, 0, 0)
  line L0 (-43.65, 30) -> (-43.65, 0) projected
  line L1 (-59.65, 0) -> (-59.65, 30) projected
  line L2 (-43.65, 0) -> (-59.65, 30)
  line L3 (-59.65, 30) -> (-43.65, 30) projected
  line L4 (-43.65, 30) -> (-59.65, 0)
  circle A0 centre (-51.65, 15) radius 1.5
  point P0 (0, 0)
  dimension "d118" = 3
extrude "Extrusion28" cut sketch "Skizze28" against normal blind 13 contours A0 L2 L4 | L4 L2 A0 | A0 L4 L2 | L2 L4 A0
sketch "Skizze29" plane through (-6, 5, 0) normal (1, 0, 0) x (0, 0, -1)
  line L0 (0, 21) -> (15, 21)
  line L1 (0, 21) -> (30, 21) projected
  line L2 (15, 21) -> (11, 21)
  line L3 (15, 21) -> (15, 17)
  line L4 (15, 21) -> (19, 21) construction
  line L5 (15, 17) -> (17.27, 17)
  line L6 (12.25, 17) -> (17.75, 17) projected
  line L7 (17.27, 17) -> (11.77, 17)
  line L8 (11.77, 17) -> (11.77, 15.75)
  line L9 (11.77, 15.75) -> (17.27, 15.75)
  line L10 (17.27, 15.75) -> (17.27, 17)
  point P0 (0, -5)
  dimension "d123" = 15
  dimension "d124" = 4
  dimension "d125" = 4
  dimension "d126" = 90
  dimension "d127" = 2.27
  dimension "d128" = 5.5
  dimension "d129" = 1.25
extrude "Extrusion29" cut sketch "Skizze29" against normal blind 16
sketch "Skizze30" plane through (0, 26, 0) normal (0, 1, 0) x (1, 0, 0)
  line L0 (-22, 30) -> (-22, 0) projected
  line L1 (-6, 0) -> (-6, 30) projected
  line L2 (-22, 0) -> (-6, 30)
  line L3 (-22, 30) -> (-6, 0)
  circle A0 centre (-14, 15) radius 1.5
  point P0 (0, 0)
  dimension "d132" = 3
extrude "Extrusion30" cut sketch "Skizze30" against normal blind 13 contours A0 L2 L3 | L3 L2 A0 | L2 L3 A0 | L2 A0 L3
sketch "Skizze31" plane through (0, 5, 0) normal (0, 1, 0) x (1, 0, 0)
  circle A0 centre (-29.5, 38) radius 2.25 projected
  circle A1 centre (1.5, 69) radius 2.25 projected
  line L0 (-29.5, 38) -> (1.5, 69)
  circle A2 centre (-29.5, 69) radius 2.25 projected
  circle A3 centre (1.5, 38) radius 2.25 projected
  line L1 (-29.5, 69) -> (1.5, 38)
  circle A4 centre (-14, 53.5) radius 11.5
  point P0 (0, 0)
  dimension "d137" = 23
extrude "Extrusion31" cut sketch "Skizze31" against normal blind 5 contours A4 L1 L0 | L0 L1 A4 | L1 A4 L0 | L0 A4 L1
sketch "Skizze32" plane through (0, 5, 0) normal (0, 1, 0) x (1, 0, 0)
  point P0 (0, 0)
sketch "Skizze33" plane through (0, 5, 0) normal (0, 1, 0) x (1, 0, 0)
  circle A0 centre (-62.65, 6) radius 1.5 projected
  circle A1 centre (-62.65, 6) radius 1.5
  point P0 (0, 0)
  dimension "d140" = 3
extrude "Extrusion32" add sketch "Skizze33" against normal blind 5
sketch "Skizze34" plane through (0, 5, 0) normal (0, 1, 0) x (1, 0, 0)
  circle A0 centre (-62.65, 23) radius 1.5 projected
  circle A1 centre (-62.65, 23) radius 1.5
  point P0 (0, 0)
  dimension "d143" = 3
extrude "Extrusion33" add sketch "Skizze34" against normal blind 5
sketch "Skizze35" plane through (0, 5, 0) normal (0, 1, 0) x (1, 0, 0)
  line L0 (-59.65, 0) -> (-59.65, 30) projected
  line L1 (-59.65, 0) -> (-73.15, 0)
  line L2 (-65.65, 0) -> (-59.65, 0) projected
  line L3 (-65.65, 0) -> (7.5, 0) projected
  line L4 (-65.65, 0) -> (-73.15, 0)
  line L5 (-73.15, 0) -> (-73.15, 75)
  line L6 (-73.15, 75) -> (-65.65, 75)
  line L7 (-65.65, 75) -> (-65.65, 0)
  point P0 (0, 0)
  dimension "d146" = 13.5
  dimension "d147" = 75
extrude "Extrusion34" add sketch "Skizze35" against normal blind 5
sketch "Skizze36" plane through (0, 5, 0) normal (0, 1, 0) x (1, 0, 0)
  line L0 (-73.15, 0) -> (-73.15, 75) projected
  line L1 (-73.15, 0) -> (-67.15, 0)
  line L2 (-67.15, 0) -> (-67.15, 6)
  line L3 (-67.15, 6) -> (-73.15, 6)
  line L4 (-73.15, 6) -> (-73.15, 0)
  circle A0 centre (-67.15, 6) radius 1.5
  point P0 (0, 0)
  dimension "d150" = 6
  dimension "d151" = 6
  dimension "d152" = 3
extrude "Extrusion35" cut sketch "Skizze36" against normal blind 5 contours A0 L2 L3 | L3 L2 A0
sketch "Skizze37" plane through (0, 5, 0) normal (0, 1, 0) x (1, 0, 0)
  circle A0 centre (-67.15, 6) radius 1.5 projected
  line L0 (-67.15, 6) -> (-67.15, 23)
  circle A1 centre (-67.15, 23) radius 1.5
  point P0 (0, 0)
  dimension "d155" = 17
  dimension "d156" = 3
extrude "Extrusion36" cut sketch "Skizze37" against normal blind 5 contours A1
sketch "Skizze38" plane through (-6, 5, 0) normal (1, 0, 0) x (0, 0, -1)
  line L0 (17.27, 17) -> (11.77, 17) projected
  line L1 (11.77, 17) -> (11.77, 17.625)
  line L2 (11.77, 17.625) -> (17.27, 17.625)
  line L3 (17.27, 17.625) -> (17.27, 17)
  line L4 (12.25, 17) -> (17.75, 17) projected
  point P0 (0, -5)
  dimension "d159" = 0.625
  dimension "d160" = 5.5
  dimension "d161" = 90
extrude "Extrusion37" cut sketch "Skizze38" against normal blind 16
sketch "Skizze39" plane through (-6, 5, 0) normal (1, 0, 0) x (0, 0, -1)
  line L0 (17.27, 15.75) -> (11.77, 15.75) projected
  line L1 (11.77, 15.75) -> (17.27, 15.75)
  line L2 (17.27, 15.75) -> (17.27, 15.125)
  line L3 (17.27, 15.125) -> (11.77, 15.125)
  line L4 (11.77, 15.125) -> (11.77, 15.75)
  point P0 (0, -5)
  dimension "d164" = 5.5
  dimension "d165" = 0.625
extrude "Extrusion38" cut sketch "Skizze39" against normal blind 16
sketch "Skizze40" plane through (-59.65, 5, -30) normal (-1, 0, 0) x (0, 0, 1)
  line L0 (12.73, 17.625) -> (18.23, 17.625) projected
  line L1 (12.25, 17) -> (17.75, 17)
  line L2 (17.75, 17) -> (17.75, 17.625)
  line L3 (17.75, 17.625) -> (12.25, 17.625)
  line L4 (12.25, 17.625) -> (12.25, 17)
  point P0 (30, -5)
  dimension "d168" = 5.5
extrude "Extrusion39" cut sketch "Skizze40" against normal blind 16
sketch "Skizze41" plane through (-59.65, 5, -30) normal (-1, 0, 0) x (0, 0, 1)
  line L0 (12.25, 15.75) -> (17.75, 15.75) projected
  line L1 (12.25, 15.75) -> (17.75, 15.75)
  line L2 (17.75, 15.75) -> (17.75, 15.125)
  line L3 (17.75, 15.125) -> (12.25, 15.125)
  line L4 (12.25, 15.125) -> (12.25, 15.75)
  point P0 (30, -5)
  dimension "d171" = 5.5
  dimension "d172" = 0.625
extrude "Extrusion40" cut sketch "Skizze41" against normal blind 16
sketch "Skizze42" plane through (-6, 5, 0) normal (1, 0, 0) x (0, 0, -1)
  line L0 (11.77, 17.625) -> (11.77, 15.125) projected
  line L1 (17.75, 15.125) -> (12.25, 15.125) projected
  line L2 (11.77, 17.625) -> (17.27, 17.625)
  line L3 (17.27, 17.625) -> (17.27, 15.125)
  line L4 (17.27, 15.125) -> (11.77, 15.125)
  line L5 (11.77, 15.125) -> (11.77, 17.625)
  point P0 (0, -5)
  dimension "d175" = 5.5
extrude "Extrusion41" add sketch "Skizze42" against normal blind 16
sketch "Skizze43" plane through (0, 26, 0) normal (0, 1, 0) x (1, 0, 0)
  circle A0 centre (-14, 15) radius 1.5 projected
  line L0 (-14, 15) -> (-6, 15)
  line L1 (-6, 0) -> (-6, 30) projected
  point P0 (0, 0)
sketch "Skizze44" plane through (-6, 5, 0) normal (1, 0, 0) x (0, 0, -1)
  line L0 (0, 21) -> (30, 21) projected
  line L1 (15, 21) -> (15, 17.5)
  line L2 (15, 17.5) -> (17.55, 17.5)
  line L3 (17.55, 17.5) -> (17.55, 15)
  line L4 (17.55, 15) -> (12.45, 15)
  line L5 (12.45, 15) -> (12.45, 17.5)
  line L6 (12.45, 17.5) -> (15, 17.5)
  point P0 (0, -5)
  dimension "d178" = 3.5
  dimension "d179" = 2.55
  dimension "d180" = 2.5
  dimension "d181" = 90
  dimension "d182" = 5.1
  dimension "d183" = 2.5
extrude "Extrusion42" cut sketch "Skizze44" against normal blind 16
sketch "Skizze45" plane through (0, 26, 0) normal (0, 1, 0) x (1, 0, 0)
  circle A0 centre (-14, 15) radius 1.5 projected
  circle A1 centre (-14, 15) radius 1.5
  point P0 (0, 0)
  dimension "d186" = 3
extrude "Extrusion43" add sketch "Skizze45" against normal blind 3.6
extrude "Extrusion44" cut sketch "Skizze43" against normal blind 3.6
sketch "Skizze46" plane through (-59.65, 5, -30) normal (-1, 0, 0) x (0, 0, 1)
  line L0 (12.25, 17.625) -> (12.25, 15.125) projected
  line L1 (12.25, 15.125) -> (17.75, 15.125) projected
  line L2 (12.25, 17.625) -> (17.75, 17.625)
  line L3 (17.75, 17.625) -> (17.75, 15.125)
  line L4 (17.75, 15.125) -> (12.25, 15.125)
  line L5 (12.25, 15.125) -> (12.25, 17.625)
  point P0 (30, -5)
extrude "Extrusion45" add sketch "Skizze46" against normal blind 16
sketch "Skizze47" plane through (0, 26, 0) normal (0, 1, 0) x (1, 0, 0)
  circle A0 centre (-51.65, 15) radius 1.5 projected
  line L0 (-51.65, 15) -> (-59.65, 15)
  line L1 (-59.65, 30) -> (-59.65, 0) projected
  point P0 (0, 0)
sketch "Skizze48" plane through (-59.65, 5, -30) normal (-1, 0, 0) x (0, 0, 1)
  line L0 (0, 21) -> (30, 21) projected
  line L1 (15, 21) -> (15, 17.5)
  line L2 (15, 21) -> (18.5, 21) construction
  line L3 (15, 17.5) -> (17.55, 17.5)
  line L4 (17.55, 17.5) -> (17.55, 15)
  line L5 (17.55, 15) -> (12.45, 15)
  line L6 (12.45, 15) -> (12.45, 17.5)
  line L7 (12.45, 17.5) -> (15, 17.5)
  point P0 (30, -5)
  dimension "d193" = 3.5
  dimension "d194" = 90
  dimension "d195" = 2.55
  dimension "d196" = 2.5
  dimension "d197" = 5.1
  dimension "d198" = 2.5
extrude "Extrusion46" cut sketch "Skizze48" against normal blind 16
sketch "Skizze49" plane through (0, 26, 0) normal (0, 1, 0) x (1, 0, 0)
  circle A0 centre (-51.65, 15) radius 1.5 projected
  circle A1 centre (-51.65, 15) radius 1.5
  point P0 (0, 0)
  dimension "d201" = 3
extrude "Extrusion47" add sketch "Skizze49" against normal blind 3.6
extrude "Extrusion48" cut sketch "Skizze47" against normal blind 3.6
properties part number "HalterungMotorNeu"
